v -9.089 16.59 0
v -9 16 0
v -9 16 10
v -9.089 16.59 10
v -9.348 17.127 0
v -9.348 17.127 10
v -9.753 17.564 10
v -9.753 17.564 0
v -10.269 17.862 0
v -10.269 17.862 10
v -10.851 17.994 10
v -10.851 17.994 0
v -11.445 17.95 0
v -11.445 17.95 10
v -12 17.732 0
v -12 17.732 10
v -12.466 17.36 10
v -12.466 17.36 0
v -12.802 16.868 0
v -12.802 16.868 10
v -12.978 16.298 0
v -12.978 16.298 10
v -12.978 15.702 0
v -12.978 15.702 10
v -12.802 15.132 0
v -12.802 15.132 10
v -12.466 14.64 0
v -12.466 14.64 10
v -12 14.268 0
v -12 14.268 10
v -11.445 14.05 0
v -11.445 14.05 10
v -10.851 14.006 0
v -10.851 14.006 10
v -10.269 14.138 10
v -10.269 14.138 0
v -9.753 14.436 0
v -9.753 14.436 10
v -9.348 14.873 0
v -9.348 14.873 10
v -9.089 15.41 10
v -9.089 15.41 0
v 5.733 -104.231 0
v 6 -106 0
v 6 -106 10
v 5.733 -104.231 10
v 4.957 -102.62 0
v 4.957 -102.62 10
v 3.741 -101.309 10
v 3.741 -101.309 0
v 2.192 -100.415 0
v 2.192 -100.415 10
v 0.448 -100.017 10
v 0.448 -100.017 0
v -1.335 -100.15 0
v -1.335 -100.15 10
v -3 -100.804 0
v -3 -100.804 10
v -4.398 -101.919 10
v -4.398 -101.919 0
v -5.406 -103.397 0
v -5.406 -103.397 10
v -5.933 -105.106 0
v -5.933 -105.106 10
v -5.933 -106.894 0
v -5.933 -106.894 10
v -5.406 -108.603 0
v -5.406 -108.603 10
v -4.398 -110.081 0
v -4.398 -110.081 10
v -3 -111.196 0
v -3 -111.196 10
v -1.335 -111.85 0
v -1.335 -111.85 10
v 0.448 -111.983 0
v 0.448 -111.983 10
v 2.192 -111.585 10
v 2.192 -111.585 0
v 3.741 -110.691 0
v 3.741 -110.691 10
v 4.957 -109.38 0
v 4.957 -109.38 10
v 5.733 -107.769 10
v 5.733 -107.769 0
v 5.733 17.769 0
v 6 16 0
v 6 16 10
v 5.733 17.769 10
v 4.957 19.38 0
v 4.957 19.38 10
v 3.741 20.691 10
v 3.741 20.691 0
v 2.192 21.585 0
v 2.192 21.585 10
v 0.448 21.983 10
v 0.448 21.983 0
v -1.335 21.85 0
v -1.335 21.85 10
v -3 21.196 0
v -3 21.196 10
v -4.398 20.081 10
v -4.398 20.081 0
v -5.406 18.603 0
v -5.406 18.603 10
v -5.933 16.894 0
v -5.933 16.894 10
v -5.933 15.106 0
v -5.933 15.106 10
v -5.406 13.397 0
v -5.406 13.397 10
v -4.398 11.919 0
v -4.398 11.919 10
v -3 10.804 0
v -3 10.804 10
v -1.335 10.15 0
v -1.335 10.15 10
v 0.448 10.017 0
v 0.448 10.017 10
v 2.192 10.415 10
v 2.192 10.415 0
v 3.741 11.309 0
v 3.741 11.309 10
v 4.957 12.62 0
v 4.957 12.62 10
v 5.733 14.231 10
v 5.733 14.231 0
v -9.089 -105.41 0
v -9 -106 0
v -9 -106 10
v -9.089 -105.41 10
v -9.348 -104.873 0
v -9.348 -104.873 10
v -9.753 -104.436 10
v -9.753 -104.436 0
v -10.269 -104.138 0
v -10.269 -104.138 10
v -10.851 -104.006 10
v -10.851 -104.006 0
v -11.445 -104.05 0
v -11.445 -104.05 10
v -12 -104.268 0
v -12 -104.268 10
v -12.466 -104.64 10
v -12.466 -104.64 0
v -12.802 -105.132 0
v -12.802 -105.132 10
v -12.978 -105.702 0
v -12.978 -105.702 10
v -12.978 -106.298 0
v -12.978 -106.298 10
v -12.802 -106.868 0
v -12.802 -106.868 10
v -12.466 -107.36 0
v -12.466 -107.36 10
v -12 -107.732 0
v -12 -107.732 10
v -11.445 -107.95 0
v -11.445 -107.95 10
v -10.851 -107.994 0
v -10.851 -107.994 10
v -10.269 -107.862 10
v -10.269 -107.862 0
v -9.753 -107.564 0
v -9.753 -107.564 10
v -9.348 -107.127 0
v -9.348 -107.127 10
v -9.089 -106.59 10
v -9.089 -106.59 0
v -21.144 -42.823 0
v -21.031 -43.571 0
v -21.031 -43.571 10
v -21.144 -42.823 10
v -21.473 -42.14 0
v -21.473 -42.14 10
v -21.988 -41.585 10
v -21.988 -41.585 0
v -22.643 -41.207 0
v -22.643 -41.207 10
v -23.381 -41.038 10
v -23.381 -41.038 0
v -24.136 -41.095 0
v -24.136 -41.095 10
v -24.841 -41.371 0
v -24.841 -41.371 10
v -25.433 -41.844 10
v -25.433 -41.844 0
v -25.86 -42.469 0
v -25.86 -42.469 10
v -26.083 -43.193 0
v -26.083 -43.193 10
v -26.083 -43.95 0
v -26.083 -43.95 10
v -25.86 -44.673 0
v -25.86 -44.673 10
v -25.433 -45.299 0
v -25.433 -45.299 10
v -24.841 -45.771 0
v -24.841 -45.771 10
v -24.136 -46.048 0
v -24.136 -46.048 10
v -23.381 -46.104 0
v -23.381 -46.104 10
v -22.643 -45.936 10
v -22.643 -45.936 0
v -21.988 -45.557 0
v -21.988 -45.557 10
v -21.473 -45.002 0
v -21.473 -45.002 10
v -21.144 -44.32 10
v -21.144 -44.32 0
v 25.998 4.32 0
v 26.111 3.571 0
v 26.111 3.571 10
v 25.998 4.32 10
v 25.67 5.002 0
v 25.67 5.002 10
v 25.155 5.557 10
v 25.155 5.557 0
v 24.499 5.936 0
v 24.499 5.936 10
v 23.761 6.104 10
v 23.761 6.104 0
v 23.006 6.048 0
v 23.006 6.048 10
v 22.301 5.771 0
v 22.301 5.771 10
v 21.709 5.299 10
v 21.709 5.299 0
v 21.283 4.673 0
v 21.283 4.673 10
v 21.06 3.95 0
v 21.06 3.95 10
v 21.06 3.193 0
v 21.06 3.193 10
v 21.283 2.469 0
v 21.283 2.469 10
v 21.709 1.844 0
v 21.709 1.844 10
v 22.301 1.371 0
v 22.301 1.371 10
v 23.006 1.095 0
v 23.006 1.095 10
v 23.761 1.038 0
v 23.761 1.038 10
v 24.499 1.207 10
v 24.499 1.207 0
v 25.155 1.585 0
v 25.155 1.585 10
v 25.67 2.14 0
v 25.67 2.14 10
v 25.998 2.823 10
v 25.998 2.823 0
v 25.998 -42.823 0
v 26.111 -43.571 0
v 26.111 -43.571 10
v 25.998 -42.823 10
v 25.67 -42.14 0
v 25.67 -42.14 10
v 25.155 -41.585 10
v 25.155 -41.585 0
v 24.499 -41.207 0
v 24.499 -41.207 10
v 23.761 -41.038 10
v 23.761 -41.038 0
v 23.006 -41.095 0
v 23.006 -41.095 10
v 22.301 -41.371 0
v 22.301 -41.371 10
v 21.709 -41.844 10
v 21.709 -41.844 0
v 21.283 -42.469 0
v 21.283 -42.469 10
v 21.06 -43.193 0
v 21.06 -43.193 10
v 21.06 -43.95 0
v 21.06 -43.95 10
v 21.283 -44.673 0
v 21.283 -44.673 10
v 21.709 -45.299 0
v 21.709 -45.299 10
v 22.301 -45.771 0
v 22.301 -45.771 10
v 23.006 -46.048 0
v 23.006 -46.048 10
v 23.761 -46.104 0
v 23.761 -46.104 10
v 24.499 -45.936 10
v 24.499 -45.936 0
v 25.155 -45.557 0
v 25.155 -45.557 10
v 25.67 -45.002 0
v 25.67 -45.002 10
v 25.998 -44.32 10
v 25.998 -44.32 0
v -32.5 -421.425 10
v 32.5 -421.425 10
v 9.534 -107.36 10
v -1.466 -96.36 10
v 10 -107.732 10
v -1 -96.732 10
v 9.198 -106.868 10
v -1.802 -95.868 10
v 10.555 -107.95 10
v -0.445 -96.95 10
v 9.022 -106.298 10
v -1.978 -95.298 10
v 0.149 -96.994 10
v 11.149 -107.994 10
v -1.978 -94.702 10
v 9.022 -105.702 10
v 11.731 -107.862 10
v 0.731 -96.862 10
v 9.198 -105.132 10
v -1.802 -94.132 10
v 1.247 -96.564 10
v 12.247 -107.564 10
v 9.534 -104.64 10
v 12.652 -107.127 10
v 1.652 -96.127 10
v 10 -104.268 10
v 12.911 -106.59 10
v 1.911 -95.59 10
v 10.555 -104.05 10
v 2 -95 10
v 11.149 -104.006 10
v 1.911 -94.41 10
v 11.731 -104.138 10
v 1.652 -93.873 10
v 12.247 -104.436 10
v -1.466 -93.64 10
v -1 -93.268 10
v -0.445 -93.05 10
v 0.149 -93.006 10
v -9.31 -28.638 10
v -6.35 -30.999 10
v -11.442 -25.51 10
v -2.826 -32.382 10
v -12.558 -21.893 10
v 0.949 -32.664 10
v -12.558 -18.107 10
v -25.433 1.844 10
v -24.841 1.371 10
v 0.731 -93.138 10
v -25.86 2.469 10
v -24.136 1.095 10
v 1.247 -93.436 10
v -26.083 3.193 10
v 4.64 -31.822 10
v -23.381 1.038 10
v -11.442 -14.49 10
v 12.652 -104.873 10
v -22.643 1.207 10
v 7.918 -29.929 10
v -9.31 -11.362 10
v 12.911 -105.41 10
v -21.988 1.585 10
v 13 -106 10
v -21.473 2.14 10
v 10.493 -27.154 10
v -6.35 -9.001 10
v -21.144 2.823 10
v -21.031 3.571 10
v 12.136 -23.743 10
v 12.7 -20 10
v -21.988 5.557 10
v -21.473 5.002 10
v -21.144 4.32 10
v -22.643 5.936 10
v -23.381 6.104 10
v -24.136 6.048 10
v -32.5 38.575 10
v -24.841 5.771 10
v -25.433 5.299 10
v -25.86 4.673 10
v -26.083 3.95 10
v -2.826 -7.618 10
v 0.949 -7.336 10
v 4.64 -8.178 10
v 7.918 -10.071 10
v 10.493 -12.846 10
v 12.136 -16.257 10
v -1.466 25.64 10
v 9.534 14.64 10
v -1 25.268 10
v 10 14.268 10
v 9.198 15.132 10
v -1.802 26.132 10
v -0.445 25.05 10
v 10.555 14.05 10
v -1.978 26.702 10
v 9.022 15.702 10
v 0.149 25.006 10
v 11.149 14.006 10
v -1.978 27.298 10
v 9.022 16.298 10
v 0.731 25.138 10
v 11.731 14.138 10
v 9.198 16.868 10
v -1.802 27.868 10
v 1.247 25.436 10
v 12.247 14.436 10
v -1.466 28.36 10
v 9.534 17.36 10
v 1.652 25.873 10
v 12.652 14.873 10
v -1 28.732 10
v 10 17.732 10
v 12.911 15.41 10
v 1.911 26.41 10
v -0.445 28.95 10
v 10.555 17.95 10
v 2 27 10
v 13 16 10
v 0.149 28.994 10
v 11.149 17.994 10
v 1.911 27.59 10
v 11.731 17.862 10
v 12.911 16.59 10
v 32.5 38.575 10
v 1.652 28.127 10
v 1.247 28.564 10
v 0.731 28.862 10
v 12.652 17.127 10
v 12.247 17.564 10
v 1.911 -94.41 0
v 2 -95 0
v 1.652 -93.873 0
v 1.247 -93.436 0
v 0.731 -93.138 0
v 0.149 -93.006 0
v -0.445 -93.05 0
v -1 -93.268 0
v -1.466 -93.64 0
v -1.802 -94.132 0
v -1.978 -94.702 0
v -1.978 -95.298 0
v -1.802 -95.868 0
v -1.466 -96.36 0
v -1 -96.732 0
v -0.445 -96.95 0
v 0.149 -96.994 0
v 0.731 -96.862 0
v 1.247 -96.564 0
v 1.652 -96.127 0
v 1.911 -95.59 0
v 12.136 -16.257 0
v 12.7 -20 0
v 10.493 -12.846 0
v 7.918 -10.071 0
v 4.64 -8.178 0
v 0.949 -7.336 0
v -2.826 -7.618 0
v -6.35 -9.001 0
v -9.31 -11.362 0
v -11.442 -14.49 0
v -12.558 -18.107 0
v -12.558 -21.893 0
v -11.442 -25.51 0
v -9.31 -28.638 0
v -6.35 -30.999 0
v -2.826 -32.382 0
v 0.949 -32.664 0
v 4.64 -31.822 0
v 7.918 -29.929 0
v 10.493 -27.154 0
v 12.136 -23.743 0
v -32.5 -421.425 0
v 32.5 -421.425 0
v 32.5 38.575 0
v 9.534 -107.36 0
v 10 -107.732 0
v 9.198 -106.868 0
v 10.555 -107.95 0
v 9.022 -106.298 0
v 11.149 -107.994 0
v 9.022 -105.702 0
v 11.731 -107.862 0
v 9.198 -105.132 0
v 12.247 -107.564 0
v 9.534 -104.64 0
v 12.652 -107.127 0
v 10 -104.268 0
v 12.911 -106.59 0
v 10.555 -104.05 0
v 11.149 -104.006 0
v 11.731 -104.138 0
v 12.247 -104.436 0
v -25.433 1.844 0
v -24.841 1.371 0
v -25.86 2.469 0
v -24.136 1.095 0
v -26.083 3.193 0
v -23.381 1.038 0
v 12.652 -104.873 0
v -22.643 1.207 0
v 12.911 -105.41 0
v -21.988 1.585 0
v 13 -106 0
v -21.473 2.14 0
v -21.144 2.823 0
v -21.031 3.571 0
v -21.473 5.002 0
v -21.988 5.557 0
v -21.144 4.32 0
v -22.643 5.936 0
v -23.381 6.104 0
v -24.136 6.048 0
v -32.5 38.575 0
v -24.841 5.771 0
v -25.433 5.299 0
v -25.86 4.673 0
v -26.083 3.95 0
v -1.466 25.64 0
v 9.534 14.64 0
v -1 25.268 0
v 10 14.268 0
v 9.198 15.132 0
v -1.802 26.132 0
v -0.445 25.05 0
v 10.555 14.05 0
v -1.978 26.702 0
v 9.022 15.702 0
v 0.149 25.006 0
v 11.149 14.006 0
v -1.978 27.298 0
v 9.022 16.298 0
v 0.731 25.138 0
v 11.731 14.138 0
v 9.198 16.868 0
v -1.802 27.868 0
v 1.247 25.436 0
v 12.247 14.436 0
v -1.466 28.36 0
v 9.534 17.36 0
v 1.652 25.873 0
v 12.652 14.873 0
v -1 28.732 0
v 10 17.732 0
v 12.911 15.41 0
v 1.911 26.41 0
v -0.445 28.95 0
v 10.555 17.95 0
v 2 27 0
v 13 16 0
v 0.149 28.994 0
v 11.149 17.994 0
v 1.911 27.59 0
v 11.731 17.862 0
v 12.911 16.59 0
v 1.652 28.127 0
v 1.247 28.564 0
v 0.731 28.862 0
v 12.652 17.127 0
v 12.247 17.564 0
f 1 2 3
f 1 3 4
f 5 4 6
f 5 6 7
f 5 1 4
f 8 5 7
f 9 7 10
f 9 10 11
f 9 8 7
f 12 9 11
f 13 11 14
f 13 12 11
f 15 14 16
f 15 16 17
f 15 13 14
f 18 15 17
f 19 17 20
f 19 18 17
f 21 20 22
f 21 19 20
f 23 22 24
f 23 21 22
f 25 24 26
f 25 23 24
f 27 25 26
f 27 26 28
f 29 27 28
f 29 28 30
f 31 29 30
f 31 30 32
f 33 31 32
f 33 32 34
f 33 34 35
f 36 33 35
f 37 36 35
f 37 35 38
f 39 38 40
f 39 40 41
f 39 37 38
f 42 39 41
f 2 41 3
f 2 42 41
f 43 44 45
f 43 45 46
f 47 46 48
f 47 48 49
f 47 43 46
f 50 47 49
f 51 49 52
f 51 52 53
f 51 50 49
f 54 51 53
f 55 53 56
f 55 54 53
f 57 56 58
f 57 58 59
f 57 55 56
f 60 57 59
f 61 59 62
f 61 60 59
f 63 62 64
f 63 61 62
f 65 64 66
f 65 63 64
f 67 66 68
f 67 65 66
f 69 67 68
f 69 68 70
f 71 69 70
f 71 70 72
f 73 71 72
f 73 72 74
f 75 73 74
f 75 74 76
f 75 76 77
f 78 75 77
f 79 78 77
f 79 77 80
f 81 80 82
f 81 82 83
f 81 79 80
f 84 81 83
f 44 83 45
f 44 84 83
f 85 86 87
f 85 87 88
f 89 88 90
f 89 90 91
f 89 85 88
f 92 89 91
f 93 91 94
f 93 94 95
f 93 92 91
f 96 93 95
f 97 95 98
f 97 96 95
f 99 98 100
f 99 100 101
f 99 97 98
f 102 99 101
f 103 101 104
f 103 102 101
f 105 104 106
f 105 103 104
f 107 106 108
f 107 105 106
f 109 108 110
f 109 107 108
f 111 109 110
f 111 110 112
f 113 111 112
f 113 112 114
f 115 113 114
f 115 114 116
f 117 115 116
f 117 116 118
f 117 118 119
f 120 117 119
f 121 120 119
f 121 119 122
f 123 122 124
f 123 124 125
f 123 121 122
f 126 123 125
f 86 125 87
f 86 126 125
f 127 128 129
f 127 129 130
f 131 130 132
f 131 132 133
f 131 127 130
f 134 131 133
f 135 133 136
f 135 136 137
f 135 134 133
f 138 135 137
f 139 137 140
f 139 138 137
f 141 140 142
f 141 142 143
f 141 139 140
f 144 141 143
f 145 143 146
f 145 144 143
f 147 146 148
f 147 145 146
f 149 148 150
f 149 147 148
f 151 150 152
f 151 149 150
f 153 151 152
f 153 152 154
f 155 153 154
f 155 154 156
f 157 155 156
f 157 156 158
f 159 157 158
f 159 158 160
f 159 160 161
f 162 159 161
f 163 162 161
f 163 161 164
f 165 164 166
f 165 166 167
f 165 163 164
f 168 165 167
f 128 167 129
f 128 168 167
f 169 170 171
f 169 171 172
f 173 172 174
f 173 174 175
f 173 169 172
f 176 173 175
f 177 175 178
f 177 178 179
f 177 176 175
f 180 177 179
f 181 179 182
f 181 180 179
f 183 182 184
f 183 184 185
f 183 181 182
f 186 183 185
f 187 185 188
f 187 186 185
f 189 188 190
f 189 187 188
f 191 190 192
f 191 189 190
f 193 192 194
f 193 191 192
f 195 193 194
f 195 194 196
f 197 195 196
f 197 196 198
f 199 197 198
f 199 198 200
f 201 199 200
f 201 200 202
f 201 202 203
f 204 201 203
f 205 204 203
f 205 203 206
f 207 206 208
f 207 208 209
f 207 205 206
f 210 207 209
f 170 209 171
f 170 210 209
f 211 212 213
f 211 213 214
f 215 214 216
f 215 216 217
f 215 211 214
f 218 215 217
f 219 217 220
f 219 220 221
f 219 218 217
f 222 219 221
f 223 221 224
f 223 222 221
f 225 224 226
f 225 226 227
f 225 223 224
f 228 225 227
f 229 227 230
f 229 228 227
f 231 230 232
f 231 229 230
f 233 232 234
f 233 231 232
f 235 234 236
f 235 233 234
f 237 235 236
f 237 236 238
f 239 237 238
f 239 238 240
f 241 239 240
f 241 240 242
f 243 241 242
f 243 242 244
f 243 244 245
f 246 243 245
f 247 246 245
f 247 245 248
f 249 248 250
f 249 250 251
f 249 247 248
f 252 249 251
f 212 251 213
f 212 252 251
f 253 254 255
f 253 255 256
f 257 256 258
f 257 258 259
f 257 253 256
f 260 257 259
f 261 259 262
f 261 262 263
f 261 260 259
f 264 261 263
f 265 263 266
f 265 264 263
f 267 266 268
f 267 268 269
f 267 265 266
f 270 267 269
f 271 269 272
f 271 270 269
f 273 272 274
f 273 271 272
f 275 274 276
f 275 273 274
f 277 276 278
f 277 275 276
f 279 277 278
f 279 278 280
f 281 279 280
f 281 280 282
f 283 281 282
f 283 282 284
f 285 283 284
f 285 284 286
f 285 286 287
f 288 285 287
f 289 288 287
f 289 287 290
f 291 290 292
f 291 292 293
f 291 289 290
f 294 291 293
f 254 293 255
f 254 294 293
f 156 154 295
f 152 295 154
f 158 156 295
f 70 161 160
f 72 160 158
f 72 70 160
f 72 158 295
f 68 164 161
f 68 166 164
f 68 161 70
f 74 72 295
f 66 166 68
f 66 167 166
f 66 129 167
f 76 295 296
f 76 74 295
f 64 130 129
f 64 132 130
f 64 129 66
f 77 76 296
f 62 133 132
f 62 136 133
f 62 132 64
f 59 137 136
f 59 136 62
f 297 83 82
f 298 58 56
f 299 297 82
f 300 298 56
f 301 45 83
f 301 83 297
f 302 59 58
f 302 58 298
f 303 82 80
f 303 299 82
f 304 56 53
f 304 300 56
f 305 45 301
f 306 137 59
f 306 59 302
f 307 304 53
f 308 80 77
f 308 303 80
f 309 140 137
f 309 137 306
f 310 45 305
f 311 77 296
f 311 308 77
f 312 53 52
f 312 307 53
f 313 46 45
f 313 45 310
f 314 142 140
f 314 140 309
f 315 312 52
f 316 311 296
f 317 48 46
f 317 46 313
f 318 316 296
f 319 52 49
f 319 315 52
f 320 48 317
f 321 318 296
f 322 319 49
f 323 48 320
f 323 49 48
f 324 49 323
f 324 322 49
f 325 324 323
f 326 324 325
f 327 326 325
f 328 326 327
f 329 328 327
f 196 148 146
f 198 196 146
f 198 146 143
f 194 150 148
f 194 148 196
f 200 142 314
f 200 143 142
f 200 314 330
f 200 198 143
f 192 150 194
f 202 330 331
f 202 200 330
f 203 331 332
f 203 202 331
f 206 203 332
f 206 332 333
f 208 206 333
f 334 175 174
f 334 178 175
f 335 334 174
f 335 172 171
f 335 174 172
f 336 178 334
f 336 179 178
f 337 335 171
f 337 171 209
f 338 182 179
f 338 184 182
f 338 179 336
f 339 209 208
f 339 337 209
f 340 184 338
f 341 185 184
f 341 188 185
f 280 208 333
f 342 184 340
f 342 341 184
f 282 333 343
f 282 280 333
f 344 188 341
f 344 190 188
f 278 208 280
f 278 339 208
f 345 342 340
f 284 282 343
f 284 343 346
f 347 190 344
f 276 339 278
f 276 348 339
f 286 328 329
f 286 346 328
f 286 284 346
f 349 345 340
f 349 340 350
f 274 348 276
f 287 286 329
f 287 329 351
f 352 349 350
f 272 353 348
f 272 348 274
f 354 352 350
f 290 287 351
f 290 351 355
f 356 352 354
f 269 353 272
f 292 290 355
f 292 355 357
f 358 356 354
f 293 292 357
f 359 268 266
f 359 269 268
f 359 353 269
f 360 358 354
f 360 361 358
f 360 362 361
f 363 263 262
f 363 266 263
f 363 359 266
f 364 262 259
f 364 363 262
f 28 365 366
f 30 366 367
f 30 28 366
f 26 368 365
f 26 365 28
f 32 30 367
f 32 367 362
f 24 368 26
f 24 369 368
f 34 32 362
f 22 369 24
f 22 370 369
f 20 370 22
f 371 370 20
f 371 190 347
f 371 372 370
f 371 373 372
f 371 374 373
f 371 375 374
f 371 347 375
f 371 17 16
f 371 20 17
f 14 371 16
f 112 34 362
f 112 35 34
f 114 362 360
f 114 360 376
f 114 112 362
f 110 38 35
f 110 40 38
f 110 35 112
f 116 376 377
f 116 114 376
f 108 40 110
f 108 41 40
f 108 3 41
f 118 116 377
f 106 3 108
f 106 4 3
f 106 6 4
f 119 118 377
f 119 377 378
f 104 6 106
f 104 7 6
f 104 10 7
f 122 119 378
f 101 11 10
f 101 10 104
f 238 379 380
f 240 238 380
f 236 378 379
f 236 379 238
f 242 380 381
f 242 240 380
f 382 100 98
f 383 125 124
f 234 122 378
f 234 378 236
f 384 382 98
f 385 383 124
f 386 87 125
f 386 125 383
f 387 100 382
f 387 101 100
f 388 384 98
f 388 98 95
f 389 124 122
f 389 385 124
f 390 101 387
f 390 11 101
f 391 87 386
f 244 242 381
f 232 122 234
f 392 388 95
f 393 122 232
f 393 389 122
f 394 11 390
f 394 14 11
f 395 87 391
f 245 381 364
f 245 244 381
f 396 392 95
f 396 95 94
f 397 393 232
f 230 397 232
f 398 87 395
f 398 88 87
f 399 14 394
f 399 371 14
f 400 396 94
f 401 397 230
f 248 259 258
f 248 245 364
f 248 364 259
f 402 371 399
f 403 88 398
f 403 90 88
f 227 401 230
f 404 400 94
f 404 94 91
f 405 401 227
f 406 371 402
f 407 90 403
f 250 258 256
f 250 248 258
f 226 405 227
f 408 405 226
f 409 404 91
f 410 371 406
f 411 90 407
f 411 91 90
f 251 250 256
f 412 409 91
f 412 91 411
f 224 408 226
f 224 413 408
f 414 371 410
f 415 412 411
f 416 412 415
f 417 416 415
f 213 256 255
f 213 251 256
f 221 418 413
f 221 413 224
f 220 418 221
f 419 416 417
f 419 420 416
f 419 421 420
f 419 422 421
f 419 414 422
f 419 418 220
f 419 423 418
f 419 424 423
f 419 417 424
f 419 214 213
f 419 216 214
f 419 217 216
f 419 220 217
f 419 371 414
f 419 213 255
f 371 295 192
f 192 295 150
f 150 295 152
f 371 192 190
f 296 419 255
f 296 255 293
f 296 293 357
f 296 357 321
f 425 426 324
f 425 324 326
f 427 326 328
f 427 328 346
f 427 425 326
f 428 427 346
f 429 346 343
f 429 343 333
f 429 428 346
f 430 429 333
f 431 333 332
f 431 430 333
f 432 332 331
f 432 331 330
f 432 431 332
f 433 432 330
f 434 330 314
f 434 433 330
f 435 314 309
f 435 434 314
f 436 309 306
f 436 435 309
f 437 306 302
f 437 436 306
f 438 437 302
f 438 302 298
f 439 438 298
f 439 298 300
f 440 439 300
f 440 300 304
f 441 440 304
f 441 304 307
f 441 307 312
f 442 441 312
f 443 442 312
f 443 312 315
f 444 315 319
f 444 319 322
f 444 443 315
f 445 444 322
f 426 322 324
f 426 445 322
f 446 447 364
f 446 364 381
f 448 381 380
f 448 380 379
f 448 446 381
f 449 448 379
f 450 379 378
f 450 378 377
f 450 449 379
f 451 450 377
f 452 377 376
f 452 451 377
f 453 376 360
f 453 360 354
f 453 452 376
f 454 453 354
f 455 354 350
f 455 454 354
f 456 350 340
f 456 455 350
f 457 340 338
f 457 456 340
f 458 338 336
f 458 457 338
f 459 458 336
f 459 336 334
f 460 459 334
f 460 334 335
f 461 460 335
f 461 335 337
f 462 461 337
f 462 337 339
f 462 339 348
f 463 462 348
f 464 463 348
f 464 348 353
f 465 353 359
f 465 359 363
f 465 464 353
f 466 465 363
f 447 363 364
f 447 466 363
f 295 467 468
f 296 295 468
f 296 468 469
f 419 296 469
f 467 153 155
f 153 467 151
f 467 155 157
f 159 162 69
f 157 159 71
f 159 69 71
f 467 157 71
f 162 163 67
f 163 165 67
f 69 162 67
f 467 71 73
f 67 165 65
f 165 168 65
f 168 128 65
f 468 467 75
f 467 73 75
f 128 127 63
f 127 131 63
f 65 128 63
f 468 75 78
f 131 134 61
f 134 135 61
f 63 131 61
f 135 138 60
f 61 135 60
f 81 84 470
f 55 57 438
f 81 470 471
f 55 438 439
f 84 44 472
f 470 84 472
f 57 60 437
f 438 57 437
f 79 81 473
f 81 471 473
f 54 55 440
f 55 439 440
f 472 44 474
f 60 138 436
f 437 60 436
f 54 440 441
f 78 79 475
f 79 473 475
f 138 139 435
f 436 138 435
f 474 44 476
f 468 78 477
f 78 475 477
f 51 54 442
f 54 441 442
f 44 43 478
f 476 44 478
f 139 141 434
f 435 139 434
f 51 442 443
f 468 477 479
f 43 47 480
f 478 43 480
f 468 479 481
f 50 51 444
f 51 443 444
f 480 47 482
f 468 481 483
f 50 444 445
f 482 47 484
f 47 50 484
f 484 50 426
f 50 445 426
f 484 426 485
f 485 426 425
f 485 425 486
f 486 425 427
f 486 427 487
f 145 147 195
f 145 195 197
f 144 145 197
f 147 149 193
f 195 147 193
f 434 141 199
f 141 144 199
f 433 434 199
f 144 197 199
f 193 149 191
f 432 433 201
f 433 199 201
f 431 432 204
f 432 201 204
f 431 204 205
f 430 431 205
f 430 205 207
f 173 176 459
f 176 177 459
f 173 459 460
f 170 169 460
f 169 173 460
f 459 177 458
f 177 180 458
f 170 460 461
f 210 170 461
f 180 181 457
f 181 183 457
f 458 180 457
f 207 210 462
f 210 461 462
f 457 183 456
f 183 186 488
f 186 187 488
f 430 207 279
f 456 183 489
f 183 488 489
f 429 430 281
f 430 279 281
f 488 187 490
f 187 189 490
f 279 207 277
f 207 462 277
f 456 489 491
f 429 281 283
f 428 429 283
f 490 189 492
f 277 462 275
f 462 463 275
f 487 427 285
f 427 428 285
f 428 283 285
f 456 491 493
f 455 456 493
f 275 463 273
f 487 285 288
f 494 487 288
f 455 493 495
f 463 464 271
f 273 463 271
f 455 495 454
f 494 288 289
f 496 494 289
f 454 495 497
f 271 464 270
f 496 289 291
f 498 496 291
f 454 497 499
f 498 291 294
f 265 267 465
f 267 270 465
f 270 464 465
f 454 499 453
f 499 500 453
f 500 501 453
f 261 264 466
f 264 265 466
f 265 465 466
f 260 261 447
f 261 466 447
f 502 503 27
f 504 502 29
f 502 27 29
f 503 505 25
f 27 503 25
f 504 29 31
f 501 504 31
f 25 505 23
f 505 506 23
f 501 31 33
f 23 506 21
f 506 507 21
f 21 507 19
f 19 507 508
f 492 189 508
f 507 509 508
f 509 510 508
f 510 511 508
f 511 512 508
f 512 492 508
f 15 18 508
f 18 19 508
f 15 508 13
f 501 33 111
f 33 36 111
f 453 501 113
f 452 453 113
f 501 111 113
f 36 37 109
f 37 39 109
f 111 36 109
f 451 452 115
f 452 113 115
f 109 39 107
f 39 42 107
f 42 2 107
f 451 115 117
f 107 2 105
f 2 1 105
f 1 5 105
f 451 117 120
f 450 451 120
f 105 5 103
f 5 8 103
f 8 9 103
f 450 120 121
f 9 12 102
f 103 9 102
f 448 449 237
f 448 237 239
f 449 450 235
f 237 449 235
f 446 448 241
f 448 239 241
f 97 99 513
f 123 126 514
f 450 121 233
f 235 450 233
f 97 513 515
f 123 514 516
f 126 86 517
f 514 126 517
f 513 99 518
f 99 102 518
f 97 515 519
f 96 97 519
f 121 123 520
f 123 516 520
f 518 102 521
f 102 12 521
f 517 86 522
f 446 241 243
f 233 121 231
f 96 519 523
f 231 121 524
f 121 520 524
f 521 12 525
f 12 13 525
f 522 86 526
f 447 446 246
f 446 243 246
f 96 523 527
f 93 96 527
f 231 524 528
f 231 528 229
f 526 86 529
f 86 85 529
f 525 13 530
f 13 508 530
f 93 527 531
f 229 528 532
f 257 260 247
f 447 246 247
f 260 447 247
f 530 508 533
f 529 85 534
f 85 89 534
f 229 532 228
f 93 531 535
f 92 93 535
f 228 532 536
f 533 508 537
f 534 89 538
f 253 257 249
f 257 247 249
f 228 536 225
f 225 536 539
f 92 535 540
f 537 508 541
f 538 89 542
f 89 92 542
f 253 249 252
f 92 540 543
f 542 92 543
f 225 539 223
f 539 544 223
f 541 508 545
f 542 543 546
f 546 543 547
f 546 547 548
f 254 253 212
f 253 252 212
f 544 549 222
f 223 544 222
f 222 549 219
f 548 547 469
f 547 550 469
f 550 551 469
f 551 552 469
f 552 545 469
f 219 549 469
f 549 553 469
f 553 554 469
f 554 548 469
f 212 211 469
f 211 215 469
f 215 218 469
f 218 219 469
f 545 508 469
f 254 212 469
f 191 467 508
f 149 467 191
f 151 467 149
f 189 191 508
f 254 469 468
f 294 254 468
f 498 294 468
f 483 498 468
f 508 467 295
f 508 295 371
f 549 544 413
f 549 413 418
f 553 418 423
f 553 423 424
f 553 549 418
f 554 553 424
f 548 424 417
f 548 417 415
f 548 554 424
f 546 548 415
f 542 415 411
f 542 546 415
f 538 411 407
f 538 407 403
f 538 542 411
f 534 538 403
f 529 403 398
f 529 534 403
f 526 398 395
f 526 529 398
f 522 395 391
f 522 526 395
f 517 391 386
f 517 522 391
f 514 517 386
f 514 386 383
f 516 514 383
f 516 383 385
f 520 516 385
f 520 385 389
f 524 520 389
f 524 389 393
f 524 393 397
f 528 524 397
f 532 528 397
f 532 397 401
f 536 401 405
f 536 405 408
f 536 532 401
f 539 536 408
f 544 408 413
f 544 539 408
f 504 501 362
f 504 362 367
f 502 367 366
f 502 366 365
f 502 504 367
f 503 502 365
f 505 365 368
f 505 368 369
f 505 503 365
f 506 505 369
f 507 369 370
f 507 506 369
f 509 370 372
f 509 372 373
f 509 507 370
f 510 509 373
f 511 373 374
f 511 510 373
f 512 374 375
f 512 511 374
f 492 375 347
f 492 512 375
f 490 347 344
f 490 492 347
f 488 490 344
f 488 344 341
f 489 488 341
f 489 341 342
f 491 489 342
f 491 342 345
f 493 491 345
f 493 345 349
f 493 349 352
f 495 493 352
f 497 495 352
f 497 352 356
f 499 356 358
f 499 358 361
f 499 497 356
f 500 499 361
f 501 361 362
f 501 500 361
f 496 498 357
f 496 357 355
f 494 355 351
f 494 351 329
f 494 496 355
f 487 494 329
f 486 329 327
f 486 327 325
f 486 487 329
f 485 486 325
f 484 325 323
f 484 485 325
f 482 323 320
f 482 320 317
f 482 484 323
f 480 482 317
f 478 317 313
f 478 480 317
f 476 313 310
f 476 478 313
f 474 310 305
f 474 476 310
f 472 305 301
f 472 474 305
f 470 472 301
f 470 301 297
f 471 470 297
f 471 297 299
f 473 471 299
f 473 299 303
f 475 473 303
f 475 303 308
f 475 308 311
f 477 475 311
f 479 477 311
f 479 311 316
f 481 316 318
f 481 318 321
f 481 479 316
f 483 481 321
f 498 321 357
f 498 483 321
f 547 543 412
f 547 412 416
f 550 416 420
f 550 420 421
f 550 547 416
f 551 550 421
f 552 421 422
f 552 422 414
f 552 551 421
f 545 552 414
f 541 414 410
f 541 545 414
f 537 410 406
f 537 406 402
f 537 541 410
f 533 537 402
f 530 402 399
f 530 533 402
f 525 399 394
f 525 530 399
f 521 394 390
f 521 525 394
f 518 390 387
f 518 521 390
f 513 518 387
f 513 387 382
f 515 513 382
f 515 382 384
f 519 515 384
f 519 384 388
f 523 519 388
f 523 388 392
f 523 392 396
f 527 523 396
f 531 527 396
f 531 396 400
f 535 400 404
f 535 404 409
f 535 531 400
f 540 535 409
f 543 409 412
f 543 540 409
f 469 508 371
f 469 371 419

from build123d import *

# Parameters (mm, degrees)
SKETCH1_W           = 65
SKETCH1_H           = 460
SKETCH1_R           = 2.54
SKETCH1_R_2         = 6
SKETCH1_R_3         = 2
SKETCH1_R_4         = 12.7
BOSS_EXTRUDE1_DEPTH = 10


with BuildPart() as part:
    # Sketch1 → Boss-Extrude1 (new body)
    with BuildSketch(Plane.XY):
        with Locations((0, -191.425)):
            Rectangle(SKETCH1_W, SKETCH1_H)
        with Locations((-23.5712, 3.5712)):
            Circle(SKETCH1_R, mode=Mode.SUBTRACT)
        with Locations((23.5712, 3.5712)):
            Circle(SKETCH1_R, mode=Mode.SUBTRACT)
        with Locations((23.5712, -43.5712)):
            Circle(SKETCH1_R, mode=Mode.SUBTRACT)
        with Locations((-23.5712, -43.5712)):
            Circle(SKETCH1_R, mode=Mode.SUBTRACT)
        with Locations((0, -106)):
            Circle(SKETCH1_R_2, mode=Mode.SUBTRACT)
        with Locations((11, -106)):
            Circle(SKETCH1_R_3, mode=Mode.SUBTRACT)
        with Locations((0, -20)):
            Circle(SKETCH1_R_4, mode=Mode.SUBTRACT)
        with Locations((0, -95)):
            Circle(SKETCH1_R_3, mode=Mode.SUBTRACT)
        with Locations((0, 16)):
            Circle(SKETCH1_R_2, mode=Mode.SUBTRACT)
        with Locations((11, 16)):
            Circle(SKETCH1_R_3, mode=Mode.SUBTRACT)
        with Locations((-11, -106)):
            Circle(SKETCH1_R_3, mode=Mode.SUBTRACT)
        with Locations((0, 27)):
            Circle(SKETCH1_R_3, mode=Mode.SUBTRACT)
        with Locations((-11, 16)):
            Circle(SKETCH1_R_3, mode=Mode.SUBTRACT)
    extrude(amount=BOSS_EXTRUDE1_DEPTH)


solid = part.part
